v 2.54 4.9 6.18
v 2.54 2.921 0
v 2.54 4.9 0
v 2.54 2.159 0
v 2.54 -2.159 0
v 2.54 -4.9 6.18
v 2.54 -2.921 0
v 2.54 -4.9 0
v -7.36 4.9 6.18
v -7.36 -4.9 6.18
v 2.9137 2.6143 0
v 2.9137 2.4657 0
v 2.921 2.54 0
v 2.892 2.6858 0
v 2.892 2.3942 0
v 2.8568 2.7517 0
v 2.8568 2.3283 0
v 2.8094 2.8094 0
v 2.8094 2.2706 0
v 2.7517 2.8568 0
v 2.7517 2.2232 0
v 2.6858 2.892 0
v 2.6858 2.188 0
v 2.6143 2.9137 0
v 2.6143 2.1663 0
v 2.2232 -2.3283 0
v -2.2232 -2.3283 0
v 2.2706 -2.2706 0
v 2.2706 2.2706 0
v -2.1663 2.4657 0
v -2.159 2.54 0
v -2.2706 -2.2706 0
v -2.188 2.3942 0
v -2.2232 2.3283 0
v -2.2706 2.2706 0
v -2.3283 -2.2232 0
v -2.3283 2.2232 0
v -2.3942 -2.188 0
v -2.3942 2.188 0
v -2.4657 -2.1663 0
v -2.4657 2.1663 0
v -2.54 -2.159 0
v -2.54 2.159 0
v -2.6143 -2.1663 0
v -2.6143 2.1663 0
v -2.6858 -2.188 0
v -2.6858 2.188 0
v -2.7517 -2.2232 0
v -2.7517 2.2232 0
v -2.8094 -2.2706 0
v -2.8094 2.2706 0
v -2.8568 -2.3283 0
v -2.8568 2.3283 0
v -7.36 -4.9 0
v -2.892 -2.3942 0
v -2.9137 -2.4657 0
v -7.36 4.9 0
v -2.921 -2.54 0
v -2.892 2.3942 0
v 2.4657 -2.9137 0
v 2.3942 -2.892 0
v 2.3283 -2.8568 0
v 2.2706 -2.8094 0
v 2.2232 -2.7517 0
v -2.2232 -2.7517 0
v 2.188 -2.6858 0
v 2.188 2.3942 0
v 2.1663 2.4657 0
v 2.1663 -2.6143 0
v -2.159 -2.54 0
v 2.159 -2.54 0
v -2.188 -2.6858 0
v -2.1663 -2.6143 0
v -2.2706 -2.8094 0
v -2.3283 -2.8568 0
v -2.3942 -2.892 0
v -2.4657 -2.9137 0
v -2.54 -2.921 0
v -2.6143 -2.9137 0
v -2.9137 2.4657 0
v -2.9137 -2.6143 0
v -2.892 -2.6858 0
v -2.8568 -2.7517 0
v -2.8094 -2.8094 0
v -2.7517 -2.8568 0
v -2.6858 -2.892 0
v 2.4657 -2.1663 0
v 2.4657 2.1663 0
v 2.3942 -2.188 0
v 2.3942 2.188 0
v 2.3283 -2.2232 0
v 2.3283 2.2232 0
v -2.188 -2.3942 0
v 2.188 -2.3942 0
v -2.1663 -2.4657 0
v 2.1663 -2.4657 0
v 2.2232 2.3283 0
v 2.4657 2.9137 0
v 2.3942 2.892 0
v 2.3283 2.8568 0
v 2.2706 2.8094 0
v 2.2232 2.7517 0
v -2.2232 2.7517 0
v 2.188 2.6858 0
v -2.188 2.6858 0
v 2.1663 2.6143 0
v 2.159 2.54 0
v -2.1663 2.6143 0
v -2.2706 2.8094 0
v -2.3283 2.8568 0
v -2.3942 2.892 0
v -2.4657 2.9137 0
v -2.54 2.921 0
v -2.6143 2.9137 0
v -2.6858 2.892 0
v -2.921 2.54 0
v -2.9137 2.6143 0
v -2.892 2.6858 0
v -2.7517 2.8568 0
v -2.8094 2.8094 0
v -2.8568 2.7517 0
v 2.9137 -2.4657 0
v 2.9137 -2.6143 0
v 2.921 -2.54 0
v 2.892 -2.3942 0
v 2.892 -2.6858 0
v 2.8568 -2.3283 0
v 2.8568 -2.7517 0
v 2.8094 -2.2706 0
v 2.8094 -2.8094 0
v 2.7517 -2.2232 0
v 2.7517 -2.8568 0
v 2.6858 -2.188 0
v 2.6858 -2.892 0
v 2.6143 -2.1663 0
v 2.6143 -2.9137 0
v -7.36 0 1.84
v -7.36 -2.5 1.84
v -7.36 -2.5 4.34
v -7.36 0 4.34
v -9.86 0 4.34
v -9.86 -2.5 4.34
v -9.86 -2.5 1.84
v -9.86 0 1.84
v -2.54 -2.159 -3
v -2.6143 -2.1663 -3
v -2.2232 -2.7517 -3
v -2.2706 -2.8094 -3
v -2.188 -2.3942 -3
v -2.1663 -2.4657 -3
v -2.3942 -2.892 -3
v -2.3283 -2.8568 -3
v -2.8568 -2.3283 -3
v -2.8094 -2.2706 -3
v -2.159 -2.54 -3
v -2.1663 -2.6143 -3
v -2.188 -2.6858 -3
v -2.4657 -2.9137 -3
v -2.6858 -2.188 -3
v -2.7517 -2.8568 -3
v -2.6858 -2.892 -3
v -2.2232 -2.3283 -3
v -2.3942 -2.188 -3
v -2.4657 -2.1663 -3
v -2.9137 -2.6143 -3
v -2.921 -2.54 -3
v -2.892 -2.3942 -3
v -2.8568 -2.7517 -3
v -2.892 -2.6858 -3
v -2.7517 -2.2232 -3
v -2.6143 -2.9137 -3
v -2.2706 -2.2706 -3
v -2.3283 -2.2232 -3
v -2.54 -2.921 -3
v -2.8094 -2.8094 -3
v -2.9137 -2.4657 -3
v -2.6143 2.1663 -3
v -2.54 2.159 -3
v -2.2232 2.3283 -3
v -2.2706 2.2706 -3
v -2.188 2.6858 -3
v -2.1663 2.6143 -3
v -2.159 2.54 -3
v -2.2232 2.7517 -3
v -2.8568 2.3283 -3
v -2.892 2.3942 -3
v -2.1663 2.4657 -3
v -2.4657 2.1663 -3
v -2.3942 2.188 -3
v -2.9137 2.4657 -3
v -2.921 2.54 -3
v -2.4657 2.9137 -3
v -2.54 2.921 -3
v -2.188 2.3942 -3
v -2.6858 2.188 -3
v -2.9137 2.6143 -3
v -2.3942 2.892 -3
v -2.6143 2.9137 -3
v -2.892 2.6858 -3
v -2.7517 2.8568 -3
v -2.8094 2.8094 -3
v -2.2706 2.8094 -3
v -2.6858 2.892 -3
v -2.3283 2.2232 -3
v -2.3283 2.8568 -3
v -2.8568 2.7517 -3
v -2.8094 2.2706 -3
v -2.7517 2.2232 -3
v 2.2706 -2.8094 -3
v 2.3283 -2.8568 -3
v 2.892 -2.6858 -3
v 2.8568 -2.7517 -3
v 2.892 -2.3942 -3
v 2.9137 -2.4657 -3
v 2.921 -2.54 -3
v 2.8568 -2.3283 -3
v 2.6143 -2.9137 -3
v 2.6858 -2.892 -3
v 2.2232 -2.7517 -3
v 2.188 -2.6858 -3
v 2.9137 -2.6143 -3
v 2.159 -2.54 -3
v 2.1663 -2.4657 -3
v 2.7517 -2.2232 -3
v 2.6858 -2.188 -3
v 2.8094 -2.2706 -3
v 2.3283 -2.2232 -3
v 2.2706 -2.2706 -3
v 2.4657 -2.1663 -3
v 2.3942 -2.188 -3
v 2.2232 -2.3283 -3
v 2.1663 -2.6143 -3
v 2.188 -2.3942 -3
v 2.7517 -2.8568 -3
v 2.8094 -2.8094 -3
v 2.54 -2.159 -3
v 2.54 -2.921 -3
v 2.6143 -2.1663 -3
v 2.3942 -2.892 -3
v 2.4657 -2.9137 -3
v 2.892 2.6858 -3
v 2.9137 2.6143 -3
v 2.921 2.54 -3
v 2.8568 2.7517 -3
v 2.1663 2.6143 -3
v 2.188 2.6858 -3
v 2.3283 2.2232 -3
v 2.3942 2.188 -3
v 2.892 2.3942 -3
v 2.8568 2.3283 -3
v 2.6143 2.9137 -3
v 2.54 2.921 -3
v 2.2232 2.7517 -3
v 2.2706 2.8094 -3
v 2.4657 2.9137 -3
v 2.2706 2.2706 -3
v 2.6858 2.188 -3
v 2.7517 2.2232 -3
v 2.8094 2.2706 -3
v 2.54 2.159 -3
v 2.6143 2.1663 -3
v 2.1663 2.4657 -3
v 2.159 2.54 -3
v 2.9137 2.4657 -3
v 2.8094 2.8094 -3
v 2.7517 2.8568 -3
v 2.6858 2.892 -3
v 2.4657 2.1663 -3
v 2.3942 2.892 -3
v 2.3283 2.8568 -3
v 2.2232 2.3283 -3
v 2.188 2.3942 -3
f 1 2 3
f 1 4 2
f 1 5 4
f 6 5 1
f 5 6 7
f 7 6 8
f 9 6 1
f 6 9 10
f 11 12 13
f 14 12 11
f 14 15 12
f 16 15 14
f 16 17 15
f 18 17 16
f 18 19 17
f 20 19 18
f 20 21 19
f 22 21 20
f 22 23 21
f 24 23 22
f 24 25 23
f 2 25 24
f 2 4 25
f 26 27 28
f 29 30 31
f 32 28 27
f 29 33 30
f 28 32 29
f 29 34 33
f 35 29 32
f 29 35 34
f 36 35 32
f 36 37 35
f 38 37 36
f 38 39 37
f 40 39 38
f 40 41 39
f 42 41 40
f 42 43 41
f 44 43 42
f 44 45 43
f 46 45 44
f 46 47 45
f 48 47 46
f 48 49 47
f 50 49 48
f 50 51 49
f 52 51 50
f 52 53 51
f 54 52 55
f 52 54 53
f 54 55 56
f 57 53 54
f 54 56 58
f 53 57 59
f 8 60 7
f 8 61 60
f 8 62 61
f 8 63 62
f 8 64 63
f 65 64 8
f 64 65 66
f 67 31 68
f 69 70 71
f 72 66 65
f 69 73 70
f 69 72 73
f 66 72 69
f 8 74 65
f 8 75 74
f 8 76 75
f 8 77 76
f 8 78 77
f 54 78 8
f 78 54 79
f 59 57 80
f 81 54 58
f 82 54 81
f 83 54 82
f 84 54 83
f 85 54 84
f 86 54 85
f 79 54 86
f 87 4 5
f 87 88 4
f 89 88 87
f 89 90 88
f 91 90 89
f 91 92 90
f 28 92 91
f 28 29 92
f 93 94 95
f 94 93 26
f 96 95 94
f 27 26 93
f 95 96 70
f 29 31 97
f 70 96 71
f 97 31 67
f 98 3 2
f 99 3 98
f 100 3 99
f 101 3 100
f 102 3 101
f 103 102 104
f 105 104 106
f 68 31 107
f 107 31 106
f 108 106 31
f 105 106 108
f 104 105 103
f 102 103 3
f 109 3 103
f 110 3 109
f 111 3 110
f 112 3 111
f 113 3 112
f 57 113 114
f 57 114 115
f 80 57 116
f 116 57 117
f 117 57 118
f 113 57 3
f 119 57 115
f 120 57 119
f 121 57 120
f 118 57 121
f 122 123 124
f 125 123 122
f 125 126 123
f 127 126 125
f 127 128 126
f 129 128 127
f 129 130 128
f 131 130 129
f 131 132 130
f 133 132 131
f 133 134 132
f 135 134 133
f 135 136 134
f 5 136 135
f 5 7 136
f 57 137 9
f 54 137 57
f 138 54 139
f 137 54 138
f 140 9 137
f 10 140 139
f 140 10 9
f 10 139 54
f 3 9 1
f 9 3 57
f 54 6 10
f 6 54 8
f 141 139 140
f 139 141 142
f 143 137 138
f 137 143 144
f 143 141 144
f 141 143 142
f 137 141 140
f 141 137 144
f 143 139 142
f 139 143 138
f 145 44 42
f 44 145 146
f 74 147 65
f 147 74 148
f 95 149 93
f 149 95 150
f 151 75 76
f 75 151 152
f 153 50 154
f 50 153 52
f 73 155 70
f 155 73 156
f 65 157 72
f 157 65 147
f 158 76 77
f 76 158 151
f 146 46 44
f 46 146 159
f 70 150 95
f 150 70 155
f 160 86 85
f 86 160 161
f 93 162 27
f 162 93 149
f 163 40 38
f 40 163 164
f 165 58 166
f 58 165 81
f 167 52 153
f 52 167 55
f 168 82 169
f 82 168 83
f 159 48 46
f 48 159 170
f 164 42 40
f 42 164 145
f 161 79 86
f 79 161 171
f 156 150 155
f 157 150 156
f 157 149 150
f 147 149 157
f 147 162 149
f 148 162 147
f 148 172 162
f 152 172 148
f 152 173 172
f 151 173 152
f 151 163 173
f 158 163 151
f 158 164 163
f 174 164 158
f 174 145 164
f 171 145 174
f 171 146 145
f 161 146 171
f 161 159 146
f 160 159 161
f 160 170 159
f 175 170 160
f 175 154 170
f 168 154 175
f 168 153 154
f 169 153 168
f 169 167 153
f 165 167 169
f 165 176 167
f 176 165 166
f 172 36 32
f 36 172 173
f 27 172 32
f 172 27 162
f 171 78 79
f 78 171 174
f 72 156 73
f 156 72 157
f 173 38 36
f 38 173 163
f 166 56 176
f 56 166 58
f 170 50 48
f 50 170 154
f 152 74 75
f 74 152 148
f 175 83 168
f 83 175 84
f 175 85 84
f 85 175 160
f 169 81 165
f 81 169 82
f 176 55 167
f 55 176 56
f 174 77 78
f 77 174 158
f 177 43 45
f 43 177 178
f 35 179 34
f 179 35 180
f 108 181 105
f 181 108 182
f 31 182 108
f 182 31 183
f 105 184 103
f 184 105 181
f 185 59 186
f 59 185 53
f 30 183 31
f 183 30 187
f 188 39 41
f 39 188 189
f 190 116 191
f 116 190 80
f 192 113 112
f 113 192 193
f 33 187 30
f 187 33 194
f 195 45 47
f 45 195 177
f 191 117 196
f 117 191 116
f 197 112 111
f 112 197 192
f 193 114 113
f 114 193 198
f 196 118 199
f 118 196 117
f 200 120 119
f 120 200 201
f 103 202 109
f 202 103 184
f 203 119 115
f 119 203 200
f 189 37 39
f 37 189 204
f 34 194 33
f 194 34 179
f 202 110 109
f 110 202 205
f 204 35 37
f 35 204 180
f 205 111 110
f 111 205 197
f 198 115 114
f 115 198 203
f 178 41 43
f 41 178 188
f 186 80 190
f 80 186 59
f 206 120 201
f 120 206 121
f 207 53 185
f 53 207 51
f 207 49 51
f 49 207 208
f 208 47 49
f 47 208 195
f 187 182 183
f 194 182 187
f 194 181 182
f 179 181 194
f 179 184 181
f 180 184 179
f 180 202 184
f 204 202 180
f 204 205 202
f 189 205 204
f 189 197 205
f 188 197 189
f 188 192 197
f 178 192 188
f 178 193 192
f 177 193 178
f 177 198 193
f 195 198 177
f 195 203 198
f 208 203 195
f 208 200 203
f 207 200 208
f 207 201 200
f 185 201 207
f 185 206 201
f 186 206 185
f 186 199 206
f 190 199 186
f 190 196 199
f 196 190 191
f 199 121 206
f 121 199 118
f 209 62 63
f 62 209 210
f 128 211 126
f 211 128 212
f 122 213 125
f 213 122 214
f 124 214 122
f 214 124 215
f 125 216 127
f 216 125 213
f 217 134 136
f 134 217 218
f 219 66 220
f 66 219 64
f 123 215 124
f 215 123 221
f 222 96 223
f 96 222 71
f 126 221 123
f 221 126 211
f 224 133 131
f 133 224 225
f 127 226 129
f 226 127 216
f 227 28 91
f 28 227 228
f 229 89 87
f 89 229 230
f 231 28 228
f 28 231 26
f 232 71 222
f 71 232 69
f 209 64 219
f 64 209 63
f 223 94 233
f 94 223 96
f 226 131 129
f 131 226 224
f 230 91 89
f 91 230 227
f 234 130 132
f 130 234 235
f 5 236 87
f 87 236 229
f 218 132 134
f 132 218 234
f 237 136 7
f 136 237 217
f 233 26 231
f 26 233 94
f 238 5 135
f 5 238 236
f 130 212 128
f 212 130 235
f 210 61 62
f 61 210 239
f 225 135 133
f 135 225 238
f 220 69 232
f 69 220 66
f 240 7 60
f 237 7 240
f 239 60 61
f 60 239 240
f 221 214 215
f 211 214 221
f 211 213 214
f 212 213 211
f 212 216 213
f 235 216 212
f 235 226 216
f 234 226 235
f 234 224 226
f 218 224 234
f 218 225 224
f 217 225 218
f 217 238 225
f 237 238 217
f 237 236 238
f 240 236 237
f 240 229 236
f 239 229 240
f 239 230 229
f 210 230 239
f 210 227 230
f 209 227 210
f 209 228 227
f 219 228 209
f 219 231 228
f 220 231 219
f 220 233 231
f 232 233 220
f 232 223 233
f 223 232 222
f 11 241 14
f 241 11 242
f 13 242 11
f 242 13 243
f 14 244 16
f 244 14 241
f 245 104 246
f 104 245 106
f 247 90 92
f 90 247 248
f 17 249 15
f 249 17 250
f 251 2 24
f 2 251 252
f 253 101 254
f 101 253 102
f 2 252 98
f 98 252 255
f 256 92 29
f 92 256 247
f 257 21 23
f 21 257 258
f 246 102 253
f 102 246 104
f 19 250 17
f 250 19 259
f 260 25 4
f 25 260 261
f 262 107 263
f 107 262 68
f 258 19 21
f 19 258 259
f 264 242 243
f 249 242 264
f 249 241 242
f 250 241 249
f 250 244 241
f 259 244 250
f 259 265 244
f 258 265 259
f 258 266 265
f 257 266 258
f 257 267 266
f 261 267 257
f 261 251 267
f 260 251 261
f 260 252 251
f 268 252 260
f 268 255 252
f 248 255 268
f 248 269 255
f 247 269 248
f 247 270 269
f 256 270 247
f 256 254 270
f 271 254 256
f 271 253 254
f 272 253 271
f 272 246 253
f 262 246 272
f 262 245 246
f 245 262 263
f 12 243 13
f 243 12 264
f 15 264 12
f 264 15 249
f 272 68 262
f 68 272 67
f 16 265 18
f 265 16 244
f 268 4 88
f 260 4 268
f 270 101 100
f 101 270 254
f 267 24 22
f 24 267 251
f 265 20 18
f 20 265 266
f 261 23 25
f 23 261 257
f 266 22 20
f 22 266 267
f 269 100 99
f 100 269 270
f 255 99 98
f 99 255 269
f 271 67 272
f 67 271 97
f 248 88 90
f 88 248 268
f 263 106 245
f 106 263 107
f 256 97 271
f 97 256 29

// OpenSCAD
//
// slide switch 0.2" spacing
//

$fn = 32;
function mm(x) = (x)*25.4;
thk = 1.6;

pin_len = 3.0;
wid = 9.9;
blen = 9.8;
thk = 6.18;


module pin_at(x,y) {
  translate( [x, y, -pin_len])
    color("gold")
    cylinder( h=pin_len, d=mm(0.03));
}

act_wid = 2.5;
act_len = 2.5;
act_hgt = 2.5;

module body() {
  pin_at( mm(-0.1), mm(-0.1));
  pin_at( mm(-0.1), mm(0.1));
  pin_at( mm(0.1), mm(-0.1));
  pin_at( mm(0.1), mm(0.1));
  translate( [-wid+mm(0.1), -blen/2, 0]) {
    color("grey") cube( [wid, blen, thk]);
    // actuator
    translate( [-act_wid, blen/2-act_len, thk/2-act_hgt/2])
      color("lightgrey")
      cube( [act_wid, act_len, act_hgt]);
  }

}

body();
